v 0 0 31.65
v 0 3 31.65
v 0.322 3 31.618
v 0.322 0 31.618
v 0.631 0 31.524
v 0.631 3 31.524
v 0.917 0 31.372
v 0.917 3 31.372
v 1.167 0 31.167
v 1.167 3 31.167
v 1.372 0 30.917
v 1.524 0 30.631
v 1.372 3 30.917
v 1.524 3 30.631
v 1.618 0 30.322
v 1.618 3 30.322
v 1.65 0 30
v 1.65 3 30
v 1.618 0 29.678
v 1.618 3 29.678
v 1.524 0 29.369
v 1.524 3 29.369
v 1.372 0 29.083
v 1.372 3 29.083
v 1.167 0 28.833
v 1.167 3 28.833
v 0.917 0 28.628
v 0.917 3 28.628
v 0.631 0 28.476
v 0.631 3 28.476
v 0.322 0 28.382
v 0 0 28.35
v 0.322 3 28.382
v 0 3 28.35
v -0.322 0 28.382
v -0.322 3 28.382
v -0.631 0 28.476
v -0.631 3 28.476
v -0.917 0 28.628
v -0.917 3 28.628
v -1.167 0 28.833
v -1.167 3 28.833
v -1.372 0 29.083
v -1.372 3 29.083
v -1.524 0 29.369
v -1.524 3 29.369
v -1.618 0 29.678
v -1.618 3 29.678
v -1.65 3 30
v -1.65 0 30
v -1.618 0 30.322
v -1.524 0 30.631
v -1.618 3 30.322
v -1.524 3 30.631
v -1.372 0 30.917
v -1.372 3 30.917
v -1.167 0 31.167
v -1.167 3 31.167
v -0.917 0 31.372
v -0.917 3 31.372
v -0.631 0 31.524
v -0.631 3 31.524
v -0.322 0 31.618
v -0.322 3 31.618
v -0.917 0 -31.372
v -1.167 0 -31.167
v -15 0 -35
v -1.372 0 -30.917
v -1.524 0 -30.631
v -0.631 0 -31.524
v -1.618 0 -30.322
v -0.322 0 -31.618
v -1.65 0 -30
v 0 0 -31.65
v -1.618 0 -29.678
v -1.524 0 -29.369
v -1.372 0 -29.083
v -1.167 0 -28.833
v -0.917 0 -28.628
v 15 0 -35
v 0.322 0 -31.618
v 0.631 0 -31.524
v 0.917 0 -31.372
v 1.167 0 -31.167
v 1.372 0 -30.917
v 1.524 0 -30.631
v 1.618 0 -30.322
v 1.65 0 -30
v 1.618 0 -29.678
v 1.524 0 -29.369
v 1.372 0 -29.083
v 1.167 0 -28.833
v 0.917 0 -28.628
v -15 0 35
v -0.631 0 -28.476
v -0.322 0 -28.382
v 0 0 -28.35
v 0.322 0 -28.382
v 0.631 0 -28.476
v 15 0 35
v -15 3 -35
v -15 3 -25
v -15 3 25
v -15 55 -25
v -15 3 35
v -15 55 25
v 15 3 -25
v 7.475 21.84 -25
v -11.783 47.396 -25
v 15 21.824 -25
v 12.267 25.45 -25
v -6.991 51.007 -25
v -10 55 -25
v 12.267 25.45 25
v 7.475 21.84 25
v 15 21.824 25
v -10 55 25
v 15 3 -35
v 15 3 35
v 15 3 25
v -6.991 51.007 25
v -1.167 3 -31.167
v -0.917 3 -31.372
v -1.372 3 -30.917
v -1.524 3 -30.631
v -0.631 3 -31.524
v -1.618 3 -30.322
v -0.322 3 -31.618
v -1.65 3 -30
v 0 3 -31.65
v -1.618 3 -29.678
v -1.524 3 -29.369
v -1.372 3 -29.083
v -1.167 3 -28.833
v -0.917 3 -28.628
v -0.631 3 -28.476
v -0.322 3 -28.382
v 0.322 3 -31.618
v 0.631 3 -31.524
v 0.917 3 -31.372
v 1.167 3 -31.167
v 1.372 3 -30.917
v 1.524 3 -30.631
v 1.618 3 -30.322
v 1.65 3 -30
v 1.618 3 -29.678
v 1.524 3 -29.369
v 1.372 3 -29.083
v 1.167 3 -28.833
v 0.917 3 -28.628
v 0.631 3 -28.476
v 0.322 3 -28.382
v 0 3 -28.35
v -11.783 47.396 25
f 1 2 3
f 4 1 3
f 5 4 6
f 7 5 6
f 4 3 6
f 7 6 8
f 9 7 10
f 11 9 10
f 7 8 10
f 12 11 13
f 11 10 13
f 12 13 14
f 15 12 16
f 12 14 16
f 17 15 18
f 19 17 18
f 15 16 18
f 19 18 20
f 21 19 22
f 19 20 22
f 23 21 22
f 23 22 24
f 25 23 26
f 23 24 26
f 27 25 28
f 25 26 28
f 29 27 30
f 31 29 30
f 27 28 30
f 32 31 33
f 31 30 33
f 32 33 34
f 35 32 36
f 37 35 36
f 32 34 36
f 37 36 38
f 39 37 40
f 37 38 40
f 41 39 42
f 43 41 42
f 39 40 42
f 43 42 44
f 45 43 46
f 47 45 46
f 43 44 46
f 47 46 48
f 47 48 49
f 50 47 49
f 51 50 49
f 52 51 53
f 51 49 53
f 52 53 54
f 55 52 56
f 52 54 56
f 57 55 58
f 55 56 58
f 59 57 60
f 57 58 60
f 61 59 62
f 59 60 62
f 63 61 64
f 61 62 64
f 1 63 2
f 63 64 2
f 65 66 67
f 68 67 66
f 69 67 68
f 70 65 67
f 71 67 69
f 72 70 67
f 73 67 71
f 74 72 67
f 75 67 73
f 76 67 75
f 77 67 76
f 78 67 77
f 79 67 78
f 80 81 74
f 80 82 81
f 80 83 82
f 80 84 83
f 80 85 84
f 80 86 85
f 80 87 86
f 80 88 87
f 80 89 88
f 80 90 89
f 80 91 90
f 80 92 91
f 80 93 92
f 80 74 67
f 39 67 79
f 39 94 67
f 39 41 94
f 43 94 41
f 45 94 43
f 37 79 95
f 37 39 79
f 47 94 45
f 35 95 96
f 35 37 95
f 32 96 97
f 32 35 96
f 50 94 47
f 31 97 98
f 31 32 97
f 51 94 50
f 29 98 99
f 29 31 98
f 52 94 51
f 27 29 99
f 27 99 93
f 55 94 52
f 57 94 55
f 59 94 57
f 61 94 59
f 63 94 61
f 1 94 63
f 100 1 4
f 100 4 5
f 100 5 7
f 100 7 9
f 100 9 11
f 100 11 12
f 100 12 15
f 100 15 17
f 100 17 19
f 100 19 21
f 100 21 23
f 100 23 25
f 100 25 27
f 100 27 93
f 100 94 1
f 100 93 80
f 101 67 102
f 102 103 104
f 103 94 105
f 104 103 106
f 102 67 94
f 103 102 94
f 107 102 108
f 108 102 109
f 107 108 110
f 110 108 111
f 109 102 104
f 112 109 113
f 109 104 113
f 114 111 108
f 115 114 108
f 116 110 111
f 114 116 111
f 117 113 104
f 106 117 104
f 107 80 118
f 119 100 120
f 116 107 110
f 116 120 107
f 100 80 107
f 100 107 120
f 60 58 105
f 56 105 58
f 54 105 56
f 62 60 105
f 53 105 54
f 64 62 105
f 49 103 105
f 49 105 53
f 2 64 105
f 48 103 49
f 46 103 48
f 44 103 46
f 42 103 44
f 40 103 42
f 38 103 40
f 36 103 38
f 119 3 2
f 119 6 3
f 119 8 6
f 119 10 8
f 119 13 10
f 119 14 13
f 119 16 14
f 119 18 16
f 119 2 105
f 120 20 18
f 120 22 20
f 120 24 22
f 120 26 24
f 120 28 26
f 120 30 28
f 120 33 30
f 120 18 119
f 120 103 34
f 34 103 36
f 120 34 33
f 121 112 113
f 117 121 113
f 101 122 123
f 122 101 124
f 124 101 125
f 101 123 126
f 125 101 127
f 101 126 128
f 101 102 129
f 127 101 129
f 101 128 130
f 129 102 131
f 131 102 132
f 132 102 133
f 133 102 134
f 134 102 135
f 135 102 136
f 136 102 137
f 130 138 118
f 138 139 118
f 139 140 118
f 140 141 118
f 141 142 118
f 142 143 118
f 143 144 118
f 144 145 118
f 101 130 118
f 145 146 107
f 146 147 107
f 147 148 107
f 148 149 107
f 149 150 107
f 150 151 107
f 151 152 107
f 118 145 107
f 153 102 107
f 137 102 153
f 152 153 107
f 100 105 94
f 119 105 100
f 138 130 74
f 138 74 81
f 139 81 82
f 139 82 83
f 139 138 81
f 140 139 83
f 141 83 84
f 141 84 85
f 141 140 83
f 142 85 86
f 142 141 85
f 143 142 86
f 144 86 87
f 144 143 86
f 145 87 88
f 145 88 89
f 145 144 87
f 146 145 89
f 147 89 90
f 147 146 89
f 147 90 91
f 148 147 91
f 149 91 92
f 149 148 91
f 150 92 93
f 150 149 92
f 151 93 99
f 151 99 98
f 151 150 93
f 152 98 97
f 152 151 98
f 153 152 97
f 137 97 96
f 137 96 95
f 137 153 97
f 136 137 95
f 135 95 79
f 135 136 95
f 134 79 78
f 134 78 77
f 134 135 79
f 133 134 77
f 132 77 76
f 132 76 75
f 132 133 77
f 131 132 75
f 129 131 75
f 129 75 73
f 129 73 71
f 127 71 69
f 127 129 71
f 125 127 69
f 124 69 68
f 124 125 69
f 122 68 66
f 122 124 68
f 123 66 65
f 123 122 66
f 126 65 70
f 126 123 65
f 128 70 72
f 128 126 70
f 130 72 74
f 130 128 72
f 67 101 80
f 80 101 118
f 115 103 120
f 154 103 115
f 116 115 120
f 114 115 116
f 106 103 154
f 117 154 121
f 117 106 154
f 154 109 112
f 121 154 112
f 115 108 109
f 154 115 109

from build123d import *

# Parameters (mm, degrees)
EXTRUDE_1_DEPTH      = 25
EXTRUDE_1_DEPTH_BACK = 25
SKETCH_2_W           = 30
SKETCH_2_H           = 3
EXTRUDE_2_DEPTH      = 10
SKETCH_3_R           = 1.65
CUT_EXTRUDE_1_DEPTH  = 3


with BuildPart() as part:
    # 草图1 → 凸台-拉伸1 (new, two sides: drawn at the far end of the back side and taken through both)
    with BuildSketch(Plane.XY.offset(-EXTRUDE_1_DEPTH_BACK)):
        Polygon((-10, 55), (-15, 55), (-15, 0), (15, 0), (15, 21.823879459), (12.267155857, 25.450486128), (7.475342796, 21.839595989), (-11.782737945, 47.395932311), (-6.990924884, 51.00682245), align=None)
    extrude(amount=EXTRUDE_1_DEPTH + EXTRUDE_1_DEPTH_BACK)

    # 草图2 → 凸台-拉伸2 (add)
    with BuildSketch(Plane.XY.offset(25)):
        with Locations((0, 1.5)):
            Rectangle(SKETCH_2_W, SKETCH_2_H)
    extrude_2 = extrude(amount=EXTRUDE_2_DEPTH)

    # 草图3 → 切除-拉伸1 (cut)
    with BuildSketch(Plane(origin=(0, 3, 0), x_dir=(1, 0, 0), z_dir=(0, 1, 0))):
        with Locations(Location((0, -30, 0), (0, 0, 270))):
            Circle(SKETCH_3_R)
    cut_extrude_1 = extrude(amount=-CUT_EXTRUDE_1_DEPTH, mode=Mode.SUBTRACT)

    # 镜向1: 凸台-拉伸2, 切除-拉伸1 across plane
    add(extrude_2.mirror(Plane.XY))
    add(cut_extrude_1.mirror(Plane.XY), mode=Mode.SUBTRACT)


solid = part.part
